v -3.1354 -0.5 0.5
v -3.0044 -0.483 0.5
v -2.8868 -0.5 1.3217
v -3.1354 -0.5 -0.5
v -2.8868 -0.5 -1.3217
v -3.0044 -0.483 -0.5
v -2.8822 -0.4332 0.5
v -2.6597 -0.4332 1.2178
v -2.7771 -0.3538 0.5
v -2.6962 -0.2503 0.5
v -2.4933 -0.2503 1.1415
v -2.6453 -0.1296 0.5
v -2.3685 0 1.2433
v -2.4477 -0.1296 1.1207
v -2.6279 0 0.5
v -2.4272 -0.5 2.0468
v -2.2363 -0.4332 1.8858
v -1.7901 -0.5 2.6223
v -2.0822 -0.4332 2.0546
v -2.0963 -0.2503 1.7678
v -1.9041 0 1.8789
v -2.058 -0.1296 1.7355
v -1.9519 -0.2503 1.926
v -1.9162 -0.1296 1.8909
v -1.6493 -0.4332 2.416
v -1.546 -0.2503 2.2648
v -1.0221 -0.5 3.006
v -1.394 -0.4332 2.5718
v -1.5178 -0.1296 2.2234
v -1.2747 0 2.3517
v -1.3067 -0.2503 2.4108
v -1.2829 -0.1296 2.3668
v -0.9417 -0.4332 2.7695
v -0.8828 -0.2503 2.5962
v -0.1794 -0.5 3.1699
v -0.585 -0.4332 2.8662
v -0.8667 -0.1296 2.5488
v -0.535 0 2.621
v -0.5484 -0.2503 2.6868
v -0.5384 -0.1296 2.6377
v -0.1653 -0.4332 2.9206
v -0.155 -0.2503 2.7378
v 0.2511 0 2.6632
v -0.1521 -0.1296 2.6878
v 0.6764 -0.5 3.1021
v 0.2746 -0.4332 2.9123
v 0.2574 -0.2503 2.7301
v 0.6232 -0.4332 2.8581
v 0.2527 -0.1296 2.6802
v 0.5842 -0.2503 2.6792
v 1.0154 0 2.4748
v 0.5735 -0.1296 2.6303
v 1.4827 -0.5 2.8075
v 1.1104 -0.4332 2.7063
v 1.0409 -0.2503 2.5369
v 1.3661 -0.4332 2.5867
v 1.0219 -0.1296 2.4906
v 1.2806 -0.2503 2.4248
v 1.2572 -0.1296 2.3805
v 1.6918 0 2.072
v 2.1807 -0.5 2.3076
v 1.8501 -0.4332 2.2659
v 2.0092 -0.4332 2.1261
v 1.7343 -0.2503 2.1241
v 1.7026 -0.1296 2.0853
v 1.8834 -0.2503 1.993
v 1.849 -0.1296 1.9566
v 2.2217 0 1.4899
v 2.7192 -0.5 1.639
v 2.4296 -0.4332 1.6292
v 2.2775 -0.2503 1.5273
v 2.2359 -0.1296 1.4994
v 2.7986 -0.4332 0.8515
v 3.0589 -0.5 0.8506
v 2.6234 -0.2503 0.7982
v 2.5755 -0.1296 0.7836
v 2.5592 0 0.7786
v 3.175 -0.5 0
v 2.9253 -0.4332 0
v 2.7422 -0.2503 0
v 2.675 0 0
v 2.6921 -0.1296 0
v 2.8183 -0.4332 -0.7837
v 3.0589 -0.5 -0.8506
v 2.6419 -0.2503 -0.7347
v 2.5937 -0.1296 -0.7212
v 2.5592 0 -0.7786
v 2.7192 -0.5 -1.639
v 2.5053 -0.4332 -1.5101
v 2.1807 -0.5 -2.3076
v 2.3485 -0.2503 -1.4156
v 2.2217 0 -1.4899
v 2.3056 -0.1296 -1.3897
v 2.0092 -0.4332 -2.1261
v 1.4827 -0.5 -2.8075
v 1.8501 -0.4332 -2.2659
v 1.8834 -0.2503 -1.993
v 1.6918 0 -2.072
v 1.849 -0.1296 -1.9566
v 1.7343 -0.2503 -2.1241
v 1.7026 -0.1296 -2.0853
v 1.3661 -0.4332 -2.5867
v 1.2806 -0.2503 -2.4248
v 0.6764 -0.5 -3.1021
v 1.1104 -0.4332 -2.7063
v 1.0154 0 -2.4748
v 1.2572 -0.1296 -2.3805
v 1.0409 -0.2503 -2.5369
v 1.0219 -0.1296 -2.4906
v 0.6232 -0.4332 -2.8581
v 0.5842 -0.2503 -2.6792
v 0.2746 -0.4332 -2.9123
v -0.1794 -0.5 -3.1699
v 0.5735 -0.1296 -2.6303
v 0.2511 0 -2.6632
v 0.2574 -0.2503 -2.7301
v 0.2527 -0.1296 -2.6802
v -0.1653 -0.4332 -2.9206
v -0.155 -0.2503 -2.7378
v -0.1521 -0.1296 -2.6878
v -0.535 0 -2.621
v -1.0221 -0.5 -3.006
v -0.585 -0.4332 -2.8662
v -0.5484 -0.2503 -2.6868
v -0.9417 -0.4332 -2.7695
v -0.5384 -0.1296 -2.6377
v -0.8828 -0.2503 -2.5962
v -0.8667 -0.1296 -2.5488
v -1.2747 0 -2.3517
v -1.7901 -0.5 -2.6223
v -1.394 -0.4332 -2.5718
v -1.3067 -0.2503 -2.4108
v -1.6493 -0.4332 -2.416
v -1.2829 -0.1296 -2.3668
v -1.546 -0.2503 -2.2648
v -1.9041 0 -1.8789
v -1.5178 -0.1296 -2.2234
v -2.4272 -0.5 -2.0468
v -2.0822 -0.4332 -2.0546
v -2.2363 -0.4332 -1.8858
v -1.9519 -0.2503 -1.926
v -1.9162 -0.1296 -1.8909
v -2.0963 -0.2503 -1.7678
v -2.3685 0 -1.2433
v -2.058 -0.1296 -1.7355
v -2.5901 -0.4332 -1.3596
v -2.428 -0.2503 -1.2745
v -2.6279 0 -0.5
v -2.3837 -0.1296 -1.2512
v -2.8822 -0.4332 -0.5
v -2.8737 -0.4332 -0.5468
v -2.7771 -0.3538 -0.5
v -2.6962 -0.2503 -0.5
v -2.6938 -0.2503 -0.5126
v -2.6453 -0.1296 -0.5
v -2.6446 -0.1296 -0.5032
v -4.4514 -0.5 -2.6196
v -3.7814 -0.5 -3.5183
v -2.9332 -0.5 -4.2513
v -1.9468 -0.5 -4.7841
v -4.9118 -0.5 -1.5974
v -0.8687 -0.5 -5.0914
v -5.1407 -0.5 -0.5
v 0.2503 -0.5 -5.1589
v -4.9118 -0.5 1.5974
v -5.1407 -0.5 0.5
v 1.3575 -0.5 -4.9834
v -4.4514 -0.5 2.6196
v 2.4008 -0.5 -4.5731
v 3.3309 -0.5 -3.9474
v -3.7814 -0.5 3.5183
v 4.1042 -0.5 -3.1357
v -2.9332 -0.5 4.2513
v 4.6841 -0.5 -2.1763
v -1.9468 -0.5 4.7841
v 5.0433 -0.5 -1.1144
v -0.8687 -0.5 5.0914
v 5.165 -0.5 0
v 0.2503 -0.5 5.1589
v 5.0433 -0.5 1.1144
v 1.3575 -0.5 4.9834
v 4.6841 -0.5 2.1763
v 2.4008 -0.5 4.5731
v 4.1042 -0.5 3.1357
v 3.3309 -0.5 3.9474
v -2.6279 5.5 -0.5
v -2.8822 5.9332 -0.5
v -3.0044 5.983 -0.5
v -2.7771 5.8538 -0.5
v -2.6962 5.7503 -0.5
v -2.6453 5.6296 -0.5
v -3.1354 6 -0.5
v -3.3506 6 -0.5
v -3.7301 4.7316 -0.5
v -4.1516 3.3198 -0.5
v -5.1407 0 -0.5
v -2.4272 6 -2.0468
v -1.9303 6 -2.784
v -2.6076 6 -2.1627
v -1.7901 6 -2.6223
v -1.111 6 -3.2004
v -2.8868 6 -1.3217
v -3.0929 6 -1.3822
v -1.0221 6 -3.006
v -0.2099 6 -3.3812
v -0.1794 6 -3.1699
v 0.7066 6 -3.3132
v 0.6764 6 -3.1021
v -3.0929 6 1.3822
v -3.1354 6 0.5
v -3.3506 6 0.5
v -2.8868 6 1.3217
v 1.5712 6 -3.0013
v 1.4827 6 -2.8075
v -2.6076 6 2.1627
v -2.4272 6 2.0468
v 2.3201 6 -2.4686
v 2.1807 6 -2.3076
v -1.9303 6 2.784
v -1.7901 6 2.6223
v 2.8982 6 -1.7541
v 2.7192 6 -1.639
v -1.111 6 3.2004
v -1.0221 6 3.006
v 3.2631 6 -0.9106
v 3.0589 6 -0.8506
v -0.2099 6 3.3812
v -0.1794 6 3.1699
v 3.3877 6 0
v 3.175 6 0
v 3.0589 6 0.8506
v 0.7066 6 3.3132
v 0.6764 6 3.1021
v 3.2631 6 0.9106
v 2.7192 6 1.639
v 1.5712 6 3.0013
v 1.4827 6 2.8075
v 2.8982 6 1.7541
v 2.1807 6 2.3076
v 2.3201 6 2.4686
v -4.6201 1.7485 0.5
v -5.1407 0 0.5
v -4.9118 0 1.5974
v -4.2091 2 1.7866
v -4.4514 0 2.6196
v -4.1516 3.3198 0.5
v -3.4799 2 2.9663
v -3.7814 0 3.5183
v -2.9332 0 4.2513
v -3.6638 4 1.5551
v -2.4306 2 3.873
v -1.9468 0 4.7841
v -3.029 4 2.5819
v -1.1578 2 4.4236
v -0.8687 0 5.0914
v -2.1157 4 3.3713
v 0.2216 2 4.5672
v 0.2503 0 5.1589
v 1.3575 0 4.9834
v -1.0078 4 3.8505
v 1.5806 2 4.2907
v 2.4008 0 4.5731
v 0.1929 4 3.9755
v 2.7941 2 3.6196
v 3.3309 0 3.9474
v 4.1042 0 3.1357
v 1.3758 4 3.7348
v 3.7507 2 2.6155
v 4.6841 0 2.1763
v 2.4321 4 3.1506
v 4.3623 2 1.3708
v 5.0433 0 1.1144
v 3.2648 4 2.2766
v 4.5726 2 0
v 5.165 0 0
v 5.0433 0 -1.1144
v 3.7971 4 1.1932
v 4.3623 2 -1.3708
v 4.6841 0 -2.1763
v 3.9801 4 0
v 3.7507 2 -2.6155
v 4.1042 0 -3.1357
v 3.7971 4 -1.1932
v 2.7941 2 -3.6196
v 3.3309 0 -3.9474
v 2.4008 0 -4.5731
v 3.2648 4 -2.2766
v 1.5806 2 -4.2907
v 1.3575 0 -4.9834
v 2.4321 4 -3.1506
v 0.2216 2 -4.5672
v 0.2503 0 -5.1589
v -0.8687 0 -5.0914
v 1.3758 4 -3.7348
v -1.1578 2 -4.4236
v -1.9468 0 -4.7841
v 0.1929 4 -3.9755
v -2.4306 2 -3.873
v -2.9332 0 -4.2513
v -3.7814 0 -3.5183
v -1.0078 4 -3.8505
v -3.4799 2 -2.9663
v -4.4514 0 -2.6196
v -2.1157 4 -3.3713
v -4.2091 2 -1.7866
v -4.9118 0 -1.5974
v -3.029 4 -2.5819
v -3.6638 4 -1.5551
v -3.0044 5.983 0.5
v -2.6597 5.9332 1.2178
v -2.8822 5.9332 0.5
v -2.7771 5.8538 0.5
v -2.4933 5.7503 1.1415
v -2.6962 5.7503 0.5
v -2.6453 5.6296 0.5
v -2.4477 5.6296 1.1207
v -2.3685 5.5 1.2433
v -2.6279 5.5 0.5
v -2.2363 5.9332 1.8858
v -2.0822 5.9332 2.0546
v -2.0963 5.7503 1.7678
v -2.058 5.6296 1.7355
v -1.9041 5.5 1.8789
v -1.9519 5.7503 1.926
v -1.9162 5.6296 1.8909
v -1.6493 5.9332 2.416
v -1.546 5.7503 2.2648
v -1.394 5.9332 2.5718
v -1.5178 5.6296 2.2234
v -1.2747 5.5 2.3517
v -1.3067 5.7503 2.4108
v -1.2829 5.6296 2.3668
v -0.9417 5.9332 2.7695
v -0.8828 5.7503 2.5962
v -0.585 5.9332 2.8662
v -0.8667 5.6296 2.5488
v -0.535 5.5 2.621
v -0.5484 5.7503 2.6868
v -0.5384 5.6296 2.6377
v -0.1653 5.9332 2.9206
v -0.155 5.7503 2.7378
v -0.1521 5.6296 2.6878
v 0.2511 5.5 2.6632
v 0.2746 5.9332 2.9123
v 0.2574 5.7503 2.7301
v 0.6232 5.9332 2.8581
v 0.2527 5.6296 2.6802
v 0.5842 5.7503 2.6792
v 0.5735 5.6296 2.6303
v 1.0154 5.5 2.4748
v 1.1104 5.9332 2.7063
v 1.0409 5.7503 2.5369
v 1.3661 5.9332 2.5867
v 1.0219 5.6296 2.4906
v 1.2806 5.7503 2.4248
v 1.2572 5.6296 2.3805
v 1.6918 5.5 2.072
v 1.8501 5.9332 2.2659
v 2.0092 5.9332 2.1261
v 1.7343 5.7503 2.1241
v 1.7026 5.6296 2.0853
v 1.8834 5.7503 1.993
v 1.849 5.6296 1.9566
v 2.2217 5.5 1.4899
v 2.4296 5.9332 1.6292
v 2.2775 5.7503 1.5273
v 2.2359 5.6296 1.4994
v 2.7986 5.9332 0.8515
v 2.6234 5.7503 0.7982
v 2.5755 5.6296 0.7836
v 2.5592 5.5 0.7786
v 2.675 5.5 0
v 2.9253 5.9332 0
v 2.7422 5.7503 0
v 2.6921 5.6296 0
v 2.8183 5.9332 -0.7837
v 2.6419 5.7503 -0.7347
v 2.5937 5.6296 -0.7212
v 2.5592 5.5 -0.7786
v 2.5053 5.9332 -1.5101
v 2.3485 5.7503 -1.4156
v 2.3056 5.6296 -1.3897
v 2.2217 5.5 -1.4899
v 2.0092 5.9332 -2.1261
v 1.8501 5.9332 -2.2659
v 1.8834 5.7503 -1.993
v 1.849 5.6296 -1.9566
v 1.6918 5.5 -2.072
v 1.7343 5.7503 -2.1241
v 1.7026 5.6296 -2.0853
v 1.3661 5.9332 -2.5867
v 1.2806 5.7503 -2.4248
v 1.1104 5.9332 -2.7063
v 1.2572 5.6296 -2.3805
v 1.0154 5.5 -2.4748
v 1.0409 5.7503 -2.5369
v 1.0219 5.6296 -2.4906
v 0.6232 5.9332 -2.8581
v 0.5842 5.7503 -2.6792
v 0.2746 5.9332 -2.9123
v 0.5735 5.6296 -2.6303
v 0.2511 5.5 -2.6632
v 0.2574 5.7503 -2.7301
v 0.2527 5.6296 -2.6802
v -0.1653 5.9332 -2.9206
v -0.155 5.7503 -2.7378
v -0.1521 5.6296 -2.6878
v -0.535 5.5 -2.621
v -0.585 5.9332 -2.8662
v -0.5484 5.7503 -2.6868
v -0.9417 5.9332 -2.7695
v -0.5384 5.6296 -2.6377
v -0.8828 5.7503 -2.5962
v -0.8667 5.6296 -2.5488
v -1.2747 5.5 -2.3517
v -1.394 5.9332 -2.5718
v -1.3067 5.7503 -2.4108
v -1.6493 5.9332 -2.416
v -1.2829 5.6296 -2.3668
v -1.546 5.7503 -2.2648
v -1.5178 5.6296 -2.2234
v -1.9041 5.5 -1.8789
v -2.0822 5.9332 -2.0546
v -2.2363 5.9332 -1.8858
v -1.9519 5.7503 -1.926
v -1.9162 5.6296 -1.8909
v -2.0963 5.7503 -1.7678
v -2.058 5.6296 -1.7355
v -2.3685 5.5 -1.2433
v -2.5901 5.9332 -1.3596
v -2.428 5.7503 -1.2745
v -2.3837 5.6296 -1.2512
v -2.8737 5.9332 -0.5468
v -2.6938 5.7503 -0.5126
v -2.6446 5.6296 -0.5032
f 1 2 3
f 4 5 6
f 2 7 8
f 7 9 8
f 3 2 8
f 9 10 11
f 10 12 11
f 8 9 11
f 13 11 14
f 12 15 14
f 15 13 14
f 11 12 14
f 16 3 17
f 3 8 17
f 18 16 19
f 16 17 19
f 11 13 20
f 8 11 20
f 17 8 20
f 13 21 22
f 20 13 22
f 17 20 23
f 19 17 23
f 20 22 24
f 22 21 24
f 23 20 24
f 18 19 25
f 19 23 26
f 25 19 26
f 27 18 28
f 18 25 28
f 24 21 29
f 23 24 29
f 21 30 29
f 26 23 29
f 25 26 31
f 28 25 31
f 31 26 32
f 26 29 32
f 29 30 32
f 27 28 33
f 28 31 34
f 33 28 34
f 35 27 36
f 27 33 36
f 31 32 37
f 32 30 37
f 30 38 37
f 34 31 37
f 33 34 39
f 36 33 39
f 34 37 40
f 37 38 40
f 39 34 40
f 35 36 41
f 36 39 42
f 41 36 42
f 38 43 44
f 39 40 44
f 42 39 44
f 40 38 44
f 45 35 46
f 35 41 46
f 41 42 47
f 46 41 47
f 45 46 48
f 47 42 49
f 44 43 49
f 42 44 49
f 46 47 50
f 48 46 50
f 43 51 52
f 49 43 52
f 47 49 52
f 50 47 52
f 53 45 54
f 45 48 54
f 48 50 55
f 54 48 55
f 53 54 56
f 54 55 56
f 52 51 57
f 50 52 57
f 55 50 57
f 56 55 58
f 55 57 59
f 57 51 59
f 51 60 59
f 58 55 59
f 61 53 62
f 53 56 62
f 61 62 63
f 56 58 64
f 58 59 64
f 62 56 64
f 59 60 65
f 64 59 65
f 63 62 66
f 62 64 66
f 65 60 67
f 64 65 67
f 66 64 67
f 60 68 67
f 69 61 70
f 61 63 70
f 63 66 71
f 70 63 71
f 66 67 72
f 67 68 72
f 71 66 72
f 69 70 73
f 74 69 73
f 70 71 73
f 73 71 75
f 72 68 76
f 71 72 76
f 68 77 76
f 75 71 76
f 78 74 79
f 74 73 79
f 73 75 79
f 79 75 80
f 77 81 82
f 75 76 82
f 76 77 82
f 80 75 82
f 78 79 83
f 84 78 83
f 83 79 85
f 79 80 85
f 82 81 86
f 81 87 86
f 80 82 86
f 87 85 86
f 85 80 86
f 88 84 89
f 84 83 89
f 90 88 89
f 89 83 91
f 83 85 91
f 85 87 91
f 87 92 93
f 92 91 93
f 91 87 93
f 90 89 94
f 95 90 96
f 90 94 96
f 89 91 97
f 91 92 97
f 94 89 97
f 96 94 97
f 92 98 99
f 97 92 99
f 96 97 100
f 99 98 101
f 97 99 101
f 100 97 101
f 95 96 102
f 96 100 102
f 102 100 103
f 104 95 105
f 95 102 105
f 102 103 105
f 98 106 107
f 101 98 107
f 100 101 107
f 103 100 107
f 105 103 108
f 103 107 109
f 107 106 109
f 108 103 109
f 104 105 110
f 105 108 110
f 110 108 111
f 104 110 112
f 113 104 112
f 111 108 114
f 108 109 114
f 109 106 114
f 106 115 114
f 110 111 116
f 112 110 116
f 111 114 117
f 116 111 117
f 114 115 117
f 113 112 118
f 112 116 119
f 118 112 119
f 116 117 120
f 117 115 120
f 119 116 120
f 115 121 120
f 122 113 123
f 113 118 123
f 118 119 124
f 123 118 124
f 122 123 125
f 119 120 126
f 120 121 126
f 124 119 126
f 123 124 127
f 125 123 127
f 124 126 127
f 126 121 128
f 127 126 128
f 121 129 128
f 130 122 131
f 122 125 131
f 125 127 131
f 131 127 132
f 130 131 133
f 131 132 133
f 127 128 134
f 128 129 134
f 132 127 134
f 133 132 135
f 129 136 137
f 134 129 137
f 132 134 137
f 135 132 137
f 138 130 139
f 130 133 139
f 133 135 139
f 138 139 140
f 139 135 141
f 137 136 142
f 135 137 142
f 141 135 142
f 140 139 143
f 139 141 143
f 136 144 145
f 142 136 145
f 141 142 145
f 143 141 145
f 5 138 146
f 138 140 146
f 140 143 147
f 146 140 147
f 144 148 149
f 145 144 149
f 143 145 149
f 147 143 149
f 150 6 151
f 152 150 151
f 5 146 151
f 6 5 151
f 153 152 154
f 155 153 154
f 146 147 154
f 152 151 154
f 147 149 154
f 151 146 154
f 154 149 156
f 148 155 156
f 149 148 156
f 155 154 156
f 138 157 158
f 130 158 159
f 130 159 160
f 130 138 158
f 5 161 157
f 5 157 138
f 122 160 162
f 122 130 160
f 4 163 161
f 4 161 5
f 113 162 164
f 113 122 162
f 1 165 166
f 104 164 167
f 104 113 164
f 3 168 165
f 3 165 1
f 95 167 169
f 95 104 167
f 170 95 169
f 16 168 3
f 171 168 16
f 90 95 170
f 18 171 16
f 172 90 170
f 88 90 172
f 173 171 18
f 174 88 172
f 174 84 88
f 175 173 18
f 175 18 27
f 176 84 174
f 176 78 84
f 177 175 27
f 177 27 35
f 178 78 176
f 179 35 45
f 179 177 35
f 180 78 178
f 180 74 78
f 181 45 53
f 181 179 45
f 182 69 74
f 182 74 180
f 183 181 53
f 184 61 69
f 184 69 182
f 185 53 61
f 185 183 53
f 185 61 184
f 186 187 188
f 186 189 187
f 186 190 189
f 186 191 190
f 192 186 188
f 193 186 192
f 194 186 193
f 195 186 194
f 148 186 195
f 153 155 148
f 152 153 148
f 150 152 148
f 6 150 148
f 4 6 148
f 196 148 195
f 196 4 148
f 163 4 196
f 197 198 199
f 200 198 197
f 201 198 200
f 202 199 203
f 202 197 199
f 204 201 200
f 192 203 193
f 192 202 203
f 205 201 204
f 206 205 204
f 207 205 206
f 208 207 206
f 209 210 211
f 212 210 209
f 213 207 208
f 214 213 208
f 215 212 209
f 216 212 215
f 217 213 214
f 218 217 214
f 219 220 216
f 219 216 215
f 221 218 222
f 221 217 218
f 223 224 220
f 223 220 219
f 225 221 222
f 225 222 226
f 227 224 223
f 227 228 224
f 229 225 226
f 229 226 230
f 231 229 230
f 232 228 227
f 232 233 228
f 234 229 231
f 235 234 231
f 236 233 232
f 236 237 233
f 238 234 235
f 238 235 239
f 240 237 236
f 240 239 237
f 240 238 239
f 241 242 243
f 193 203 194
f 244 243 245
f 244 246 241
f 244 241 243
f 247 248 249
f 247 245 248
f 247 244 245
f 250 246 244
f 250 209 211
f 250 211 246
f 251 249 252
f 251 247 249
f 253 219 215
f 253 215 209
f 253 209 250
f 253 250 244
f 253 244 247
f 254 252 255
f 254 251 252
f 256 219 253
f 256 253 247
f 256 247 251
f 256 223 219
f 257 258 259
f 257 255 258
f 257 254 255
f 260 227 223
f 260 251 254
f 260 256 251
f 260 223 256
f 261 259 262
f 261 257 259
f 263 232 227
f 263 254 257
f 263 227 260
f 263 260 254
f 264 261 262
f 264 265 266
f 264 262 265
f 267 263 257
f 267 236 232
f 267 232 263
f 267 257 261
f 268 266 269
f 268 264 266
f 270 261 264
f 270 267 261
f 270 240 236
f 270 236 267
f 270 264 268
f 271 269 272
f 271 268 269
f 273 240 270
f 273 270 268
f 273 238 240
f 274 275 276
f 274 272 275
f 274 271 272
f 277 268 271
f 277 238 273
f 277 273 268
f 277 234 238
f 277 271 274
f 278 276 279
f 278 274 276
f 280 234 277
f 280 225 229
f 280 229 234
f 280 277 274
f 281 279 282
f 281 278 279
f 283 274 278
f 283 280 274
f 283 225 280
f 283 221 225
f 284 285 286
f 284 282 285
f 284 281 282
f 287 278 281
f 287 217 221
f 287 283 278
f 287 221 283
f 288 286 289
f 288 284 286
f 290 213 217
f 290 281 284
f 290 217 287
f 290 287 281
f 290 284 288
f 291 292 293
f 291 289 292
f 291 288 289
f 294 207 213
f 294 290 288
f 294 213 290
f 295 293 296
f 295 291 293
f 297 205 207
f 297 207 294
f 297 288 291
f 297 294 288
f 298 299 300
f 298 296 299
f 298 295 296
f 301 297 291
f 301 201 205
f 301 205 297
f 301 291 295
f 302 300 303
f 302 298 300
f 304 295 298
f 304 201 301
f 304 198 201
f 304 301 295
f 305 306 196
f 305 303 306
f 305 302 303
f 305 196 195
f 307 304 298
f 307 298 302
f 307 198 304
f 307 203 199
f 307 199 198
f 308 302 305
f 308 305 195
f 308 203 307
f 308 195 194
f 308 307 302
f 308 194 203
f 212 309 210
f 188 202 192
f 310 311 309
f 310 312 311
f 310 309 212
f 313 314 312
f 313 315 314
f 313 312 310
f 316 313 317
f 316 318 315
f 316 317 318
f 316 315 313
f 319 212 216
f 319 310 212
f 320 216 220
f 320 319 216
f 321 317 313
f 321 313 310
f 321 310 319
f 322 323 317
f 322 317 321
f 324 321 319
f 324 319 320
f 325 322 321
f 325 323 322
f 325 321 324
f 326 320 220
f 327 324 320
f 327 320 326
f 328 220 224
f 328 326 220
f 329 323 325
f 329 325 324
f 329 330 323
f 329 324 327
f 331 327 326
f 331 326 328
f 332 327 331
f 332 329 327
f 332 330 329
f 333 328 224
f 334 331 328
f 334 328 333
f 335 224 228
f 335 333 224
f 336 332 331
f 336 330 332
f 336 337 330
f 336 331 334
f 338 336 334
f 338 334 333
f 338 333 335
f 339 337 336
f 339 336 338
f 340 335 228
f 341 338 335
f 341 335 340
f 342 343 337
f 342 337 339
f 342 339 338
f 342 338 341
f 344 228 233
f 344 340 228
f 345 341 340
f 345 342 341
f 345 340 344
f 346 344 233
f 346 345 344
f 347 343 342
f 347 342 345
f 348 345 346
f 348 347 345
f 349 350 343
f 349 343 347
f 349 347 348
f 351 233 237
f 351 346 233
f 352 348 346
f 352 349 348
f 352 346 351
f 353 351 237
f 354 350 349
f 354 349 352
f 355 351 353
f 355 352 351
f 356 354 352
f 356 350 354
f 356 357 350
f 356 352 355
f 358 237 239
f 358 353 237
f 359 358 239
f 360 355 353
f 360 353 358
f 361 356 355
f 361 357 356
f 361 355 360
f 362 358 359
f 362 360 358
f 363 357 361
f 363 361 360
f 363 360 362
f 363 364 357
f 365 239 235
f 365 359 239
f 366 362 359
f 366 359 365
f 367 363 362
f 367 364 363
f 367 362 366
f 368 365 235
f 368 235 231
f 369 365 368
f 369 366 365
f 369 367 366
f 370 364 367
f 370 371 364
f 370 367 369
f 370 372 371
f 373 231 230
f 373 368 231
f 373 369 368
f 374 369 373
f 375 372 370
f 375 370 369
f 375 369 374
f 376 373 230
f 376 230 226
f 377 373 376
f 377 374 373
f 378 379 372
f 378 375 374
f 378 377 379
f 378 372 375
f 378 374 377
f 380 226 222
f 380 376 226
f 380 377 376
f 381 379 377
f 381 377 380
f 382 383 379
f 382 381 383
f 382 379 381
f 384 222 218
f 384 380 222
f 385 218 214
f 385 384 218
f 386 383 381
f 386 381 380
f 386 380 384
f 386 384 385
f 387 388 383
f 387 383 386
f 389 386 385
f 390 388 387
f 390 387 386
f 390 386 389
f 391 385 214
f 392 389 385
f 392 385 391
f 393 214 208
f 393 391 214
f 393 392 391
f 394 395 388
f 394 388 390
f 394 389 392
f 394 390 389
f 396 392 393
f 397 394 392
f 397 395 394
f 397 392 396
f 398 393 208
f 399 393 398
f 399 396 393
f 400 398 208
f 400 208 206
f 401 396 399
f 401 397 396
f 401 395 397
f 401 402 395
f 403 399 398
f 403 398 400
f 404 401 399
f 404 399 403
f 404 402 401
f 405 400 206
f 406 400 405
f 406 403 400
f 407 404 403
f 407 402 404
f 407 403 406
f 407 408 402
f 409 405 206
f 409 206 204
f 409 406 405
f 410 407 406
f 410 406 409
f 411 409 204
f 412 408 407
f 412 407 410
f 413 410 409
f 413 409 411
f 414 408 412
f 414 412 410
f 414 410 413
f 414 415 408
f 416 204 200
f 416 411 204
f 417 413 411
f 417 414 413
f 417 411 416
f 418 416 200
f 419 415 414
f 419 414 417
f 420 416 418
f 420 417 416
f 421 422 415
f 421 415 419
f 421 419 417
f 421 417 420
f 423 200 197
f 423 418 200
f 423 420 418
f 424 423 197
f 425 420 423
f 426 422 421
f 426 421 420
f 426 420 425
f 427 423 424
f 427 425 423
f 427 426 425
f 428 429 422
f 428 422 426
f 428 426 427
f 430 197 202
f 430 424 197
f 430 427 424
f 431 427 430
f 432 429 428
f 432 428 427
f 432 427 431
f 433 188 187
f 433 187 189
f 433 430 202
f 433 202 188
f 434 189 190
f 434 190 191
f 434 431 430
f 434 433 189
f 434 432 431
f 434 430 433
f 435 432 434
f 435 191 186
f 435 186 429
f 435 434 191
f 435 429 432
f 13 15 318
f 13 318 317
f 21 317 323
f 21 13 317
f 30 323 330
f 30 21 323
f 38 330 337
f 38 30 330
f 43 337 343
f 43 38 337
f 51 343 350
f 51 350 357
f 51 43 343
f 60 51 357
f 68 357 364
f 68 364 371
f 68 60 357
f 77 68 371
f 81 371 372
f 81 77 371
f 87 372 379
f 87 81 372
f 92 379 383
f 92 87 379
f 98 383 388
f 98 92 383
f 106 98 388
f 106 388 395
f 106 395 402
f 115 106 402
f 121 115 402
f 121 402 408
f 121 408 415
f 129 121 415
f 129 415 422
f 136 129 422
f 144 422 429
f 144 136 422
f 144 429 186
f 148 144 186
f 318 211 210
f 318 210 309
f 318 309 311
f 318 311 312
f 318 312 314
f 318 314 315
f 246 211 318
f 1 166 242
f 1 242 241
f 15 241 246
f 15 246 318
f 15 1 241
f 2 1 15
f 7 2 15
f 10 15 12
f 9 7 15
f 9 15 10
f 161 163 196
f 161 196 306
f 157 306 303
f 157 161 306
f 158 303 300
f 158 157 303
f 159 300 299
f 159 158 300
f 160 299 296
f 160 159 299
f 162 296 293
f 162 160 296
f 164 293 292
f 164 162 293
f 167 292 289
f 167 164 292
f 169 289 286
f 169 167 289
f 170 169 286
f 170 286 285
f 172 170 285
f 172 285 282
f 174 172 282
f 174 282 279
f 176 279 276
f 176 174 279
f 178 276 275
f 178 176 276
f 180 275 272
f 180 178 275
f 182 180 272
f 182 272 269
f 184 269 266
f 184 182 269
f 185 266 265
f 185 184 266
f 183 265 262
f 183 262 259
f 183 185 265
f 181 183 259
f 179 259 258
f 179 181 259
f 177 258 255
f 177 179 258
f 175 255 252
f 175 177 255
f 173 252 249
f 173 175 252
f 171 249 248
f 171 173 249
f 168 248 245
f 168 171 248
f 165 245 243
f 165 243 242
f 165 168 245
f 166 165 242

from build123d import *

# Parameters (mm, degrees)
SKETCH1_R           = 5.164999999999999
SKETCH1_R_2         = 2.675
BOSS_EXTRUDE1_DEPTH = 6
CHAMFER1_SIZE       = 6
CHAMFER1_SIZE_2     = 1.77728097
CUT_EXTRUDE1_DEPTH  = 10.452748277617466
BOSS_EXTRUDE2_START = 0.5
BOSS_EXTRUDE2_DEPTH = 0.5
FILLET1_R           = 0.5


with BuildPart() as part:
    # Sketch1 → Boss-Extrude1 (new body)
    with BuildSketch(Plane(origin=(0, 0, 0), x_dir=(1, 0, 0), z_dir=(0, 1, 0))):
        with Locations(Location((0, 0, 0), (0, 0, 270))):
            Circle(SKETCH1_R)
        with Locations(Location((0, 0, 0), (0, 0, 270))):
            Circle(SKETCH1_R_2, mode=Mode.SUBTRACT)
    extrude(amount=BOSS_EXTRUDE1_DEPTH)

    # Chamfer1
    # the kernel refuses this chamfer: 6, 1.77728097 mm, written as the material it takes off along each edge
    with BuildSketch(Plane(origin=(0, 6, 0), x_dir=(-1.8e-16, 0, 1), z_dir=(-1, 0, -1.8e-16))) as chamfer1_piece_1:
        Polygon((5.164999999999999, -CHAMFER1_SIZE), (5.164999999999999 - CHAMFER1_SIZE_2, 0), (5.164999999999999, 0), align=None)
    revolve(axis=Axis((0, 6, 0), (0, 1, 0)), mode=Mode.SUBTRACT)

    # Sketch2 → Cut-Extrude1 (cut, through all)
    with BuildSketch(Plane(origin=(0, 6, 0), x_dir=(1, 0, 0), z_dir=(0, 1, 0))):
        Polygon((-6e-17, 0.5), (-6.017243985575578, 0.4999999999999993), (-6.017243985575578, -0.5000000000000008), (6e-17, -0.5), align=None)
    extrude(amount=-CUT_EXTRUDE1_DEPTH, mode=Mode.SUBTRACT)

    # Sketch3 → Boss-Extrude2 (add)
    with BuildSketch(Plane.XZ.offset(BOSS_EXTRUDE2_START)):
        with BuildLine():
            Line((-2.6278555896395814, -0.4999999999999993), (-5.140741678007149, -0.49999999999999917))
            ThreePointArc((-5.140741678007149, -0.49999999999999917), (5.164999999999977, -2.29e-15), (-5.140741678007172, 0.5000000000000027))
            Line((-5.140741678007172, 0.5000000000000027), (-2.627855589639582, 0.5000000000000001))
            ThreePointArc((-2.627855589639582, 0.5000000000000001), (2.6749999999999985, 0), (-2.6278555896395814, -0.4999999999999993))
        make_face()
    extrude(amount=-BOSS_EXTRUDE2_DEPTH)

    # Fillet1
    fillet1_edges = [part.edges().sort_by_distance(p)[0] for p in [
        (2.6750000000000003, 6, -1.288e-14),
        (2.674999999999999, -0.5, 5.4e-16),
    ]]
    fillet(fillet1_edges, radius=FILLET1_R)


solid = part.part
